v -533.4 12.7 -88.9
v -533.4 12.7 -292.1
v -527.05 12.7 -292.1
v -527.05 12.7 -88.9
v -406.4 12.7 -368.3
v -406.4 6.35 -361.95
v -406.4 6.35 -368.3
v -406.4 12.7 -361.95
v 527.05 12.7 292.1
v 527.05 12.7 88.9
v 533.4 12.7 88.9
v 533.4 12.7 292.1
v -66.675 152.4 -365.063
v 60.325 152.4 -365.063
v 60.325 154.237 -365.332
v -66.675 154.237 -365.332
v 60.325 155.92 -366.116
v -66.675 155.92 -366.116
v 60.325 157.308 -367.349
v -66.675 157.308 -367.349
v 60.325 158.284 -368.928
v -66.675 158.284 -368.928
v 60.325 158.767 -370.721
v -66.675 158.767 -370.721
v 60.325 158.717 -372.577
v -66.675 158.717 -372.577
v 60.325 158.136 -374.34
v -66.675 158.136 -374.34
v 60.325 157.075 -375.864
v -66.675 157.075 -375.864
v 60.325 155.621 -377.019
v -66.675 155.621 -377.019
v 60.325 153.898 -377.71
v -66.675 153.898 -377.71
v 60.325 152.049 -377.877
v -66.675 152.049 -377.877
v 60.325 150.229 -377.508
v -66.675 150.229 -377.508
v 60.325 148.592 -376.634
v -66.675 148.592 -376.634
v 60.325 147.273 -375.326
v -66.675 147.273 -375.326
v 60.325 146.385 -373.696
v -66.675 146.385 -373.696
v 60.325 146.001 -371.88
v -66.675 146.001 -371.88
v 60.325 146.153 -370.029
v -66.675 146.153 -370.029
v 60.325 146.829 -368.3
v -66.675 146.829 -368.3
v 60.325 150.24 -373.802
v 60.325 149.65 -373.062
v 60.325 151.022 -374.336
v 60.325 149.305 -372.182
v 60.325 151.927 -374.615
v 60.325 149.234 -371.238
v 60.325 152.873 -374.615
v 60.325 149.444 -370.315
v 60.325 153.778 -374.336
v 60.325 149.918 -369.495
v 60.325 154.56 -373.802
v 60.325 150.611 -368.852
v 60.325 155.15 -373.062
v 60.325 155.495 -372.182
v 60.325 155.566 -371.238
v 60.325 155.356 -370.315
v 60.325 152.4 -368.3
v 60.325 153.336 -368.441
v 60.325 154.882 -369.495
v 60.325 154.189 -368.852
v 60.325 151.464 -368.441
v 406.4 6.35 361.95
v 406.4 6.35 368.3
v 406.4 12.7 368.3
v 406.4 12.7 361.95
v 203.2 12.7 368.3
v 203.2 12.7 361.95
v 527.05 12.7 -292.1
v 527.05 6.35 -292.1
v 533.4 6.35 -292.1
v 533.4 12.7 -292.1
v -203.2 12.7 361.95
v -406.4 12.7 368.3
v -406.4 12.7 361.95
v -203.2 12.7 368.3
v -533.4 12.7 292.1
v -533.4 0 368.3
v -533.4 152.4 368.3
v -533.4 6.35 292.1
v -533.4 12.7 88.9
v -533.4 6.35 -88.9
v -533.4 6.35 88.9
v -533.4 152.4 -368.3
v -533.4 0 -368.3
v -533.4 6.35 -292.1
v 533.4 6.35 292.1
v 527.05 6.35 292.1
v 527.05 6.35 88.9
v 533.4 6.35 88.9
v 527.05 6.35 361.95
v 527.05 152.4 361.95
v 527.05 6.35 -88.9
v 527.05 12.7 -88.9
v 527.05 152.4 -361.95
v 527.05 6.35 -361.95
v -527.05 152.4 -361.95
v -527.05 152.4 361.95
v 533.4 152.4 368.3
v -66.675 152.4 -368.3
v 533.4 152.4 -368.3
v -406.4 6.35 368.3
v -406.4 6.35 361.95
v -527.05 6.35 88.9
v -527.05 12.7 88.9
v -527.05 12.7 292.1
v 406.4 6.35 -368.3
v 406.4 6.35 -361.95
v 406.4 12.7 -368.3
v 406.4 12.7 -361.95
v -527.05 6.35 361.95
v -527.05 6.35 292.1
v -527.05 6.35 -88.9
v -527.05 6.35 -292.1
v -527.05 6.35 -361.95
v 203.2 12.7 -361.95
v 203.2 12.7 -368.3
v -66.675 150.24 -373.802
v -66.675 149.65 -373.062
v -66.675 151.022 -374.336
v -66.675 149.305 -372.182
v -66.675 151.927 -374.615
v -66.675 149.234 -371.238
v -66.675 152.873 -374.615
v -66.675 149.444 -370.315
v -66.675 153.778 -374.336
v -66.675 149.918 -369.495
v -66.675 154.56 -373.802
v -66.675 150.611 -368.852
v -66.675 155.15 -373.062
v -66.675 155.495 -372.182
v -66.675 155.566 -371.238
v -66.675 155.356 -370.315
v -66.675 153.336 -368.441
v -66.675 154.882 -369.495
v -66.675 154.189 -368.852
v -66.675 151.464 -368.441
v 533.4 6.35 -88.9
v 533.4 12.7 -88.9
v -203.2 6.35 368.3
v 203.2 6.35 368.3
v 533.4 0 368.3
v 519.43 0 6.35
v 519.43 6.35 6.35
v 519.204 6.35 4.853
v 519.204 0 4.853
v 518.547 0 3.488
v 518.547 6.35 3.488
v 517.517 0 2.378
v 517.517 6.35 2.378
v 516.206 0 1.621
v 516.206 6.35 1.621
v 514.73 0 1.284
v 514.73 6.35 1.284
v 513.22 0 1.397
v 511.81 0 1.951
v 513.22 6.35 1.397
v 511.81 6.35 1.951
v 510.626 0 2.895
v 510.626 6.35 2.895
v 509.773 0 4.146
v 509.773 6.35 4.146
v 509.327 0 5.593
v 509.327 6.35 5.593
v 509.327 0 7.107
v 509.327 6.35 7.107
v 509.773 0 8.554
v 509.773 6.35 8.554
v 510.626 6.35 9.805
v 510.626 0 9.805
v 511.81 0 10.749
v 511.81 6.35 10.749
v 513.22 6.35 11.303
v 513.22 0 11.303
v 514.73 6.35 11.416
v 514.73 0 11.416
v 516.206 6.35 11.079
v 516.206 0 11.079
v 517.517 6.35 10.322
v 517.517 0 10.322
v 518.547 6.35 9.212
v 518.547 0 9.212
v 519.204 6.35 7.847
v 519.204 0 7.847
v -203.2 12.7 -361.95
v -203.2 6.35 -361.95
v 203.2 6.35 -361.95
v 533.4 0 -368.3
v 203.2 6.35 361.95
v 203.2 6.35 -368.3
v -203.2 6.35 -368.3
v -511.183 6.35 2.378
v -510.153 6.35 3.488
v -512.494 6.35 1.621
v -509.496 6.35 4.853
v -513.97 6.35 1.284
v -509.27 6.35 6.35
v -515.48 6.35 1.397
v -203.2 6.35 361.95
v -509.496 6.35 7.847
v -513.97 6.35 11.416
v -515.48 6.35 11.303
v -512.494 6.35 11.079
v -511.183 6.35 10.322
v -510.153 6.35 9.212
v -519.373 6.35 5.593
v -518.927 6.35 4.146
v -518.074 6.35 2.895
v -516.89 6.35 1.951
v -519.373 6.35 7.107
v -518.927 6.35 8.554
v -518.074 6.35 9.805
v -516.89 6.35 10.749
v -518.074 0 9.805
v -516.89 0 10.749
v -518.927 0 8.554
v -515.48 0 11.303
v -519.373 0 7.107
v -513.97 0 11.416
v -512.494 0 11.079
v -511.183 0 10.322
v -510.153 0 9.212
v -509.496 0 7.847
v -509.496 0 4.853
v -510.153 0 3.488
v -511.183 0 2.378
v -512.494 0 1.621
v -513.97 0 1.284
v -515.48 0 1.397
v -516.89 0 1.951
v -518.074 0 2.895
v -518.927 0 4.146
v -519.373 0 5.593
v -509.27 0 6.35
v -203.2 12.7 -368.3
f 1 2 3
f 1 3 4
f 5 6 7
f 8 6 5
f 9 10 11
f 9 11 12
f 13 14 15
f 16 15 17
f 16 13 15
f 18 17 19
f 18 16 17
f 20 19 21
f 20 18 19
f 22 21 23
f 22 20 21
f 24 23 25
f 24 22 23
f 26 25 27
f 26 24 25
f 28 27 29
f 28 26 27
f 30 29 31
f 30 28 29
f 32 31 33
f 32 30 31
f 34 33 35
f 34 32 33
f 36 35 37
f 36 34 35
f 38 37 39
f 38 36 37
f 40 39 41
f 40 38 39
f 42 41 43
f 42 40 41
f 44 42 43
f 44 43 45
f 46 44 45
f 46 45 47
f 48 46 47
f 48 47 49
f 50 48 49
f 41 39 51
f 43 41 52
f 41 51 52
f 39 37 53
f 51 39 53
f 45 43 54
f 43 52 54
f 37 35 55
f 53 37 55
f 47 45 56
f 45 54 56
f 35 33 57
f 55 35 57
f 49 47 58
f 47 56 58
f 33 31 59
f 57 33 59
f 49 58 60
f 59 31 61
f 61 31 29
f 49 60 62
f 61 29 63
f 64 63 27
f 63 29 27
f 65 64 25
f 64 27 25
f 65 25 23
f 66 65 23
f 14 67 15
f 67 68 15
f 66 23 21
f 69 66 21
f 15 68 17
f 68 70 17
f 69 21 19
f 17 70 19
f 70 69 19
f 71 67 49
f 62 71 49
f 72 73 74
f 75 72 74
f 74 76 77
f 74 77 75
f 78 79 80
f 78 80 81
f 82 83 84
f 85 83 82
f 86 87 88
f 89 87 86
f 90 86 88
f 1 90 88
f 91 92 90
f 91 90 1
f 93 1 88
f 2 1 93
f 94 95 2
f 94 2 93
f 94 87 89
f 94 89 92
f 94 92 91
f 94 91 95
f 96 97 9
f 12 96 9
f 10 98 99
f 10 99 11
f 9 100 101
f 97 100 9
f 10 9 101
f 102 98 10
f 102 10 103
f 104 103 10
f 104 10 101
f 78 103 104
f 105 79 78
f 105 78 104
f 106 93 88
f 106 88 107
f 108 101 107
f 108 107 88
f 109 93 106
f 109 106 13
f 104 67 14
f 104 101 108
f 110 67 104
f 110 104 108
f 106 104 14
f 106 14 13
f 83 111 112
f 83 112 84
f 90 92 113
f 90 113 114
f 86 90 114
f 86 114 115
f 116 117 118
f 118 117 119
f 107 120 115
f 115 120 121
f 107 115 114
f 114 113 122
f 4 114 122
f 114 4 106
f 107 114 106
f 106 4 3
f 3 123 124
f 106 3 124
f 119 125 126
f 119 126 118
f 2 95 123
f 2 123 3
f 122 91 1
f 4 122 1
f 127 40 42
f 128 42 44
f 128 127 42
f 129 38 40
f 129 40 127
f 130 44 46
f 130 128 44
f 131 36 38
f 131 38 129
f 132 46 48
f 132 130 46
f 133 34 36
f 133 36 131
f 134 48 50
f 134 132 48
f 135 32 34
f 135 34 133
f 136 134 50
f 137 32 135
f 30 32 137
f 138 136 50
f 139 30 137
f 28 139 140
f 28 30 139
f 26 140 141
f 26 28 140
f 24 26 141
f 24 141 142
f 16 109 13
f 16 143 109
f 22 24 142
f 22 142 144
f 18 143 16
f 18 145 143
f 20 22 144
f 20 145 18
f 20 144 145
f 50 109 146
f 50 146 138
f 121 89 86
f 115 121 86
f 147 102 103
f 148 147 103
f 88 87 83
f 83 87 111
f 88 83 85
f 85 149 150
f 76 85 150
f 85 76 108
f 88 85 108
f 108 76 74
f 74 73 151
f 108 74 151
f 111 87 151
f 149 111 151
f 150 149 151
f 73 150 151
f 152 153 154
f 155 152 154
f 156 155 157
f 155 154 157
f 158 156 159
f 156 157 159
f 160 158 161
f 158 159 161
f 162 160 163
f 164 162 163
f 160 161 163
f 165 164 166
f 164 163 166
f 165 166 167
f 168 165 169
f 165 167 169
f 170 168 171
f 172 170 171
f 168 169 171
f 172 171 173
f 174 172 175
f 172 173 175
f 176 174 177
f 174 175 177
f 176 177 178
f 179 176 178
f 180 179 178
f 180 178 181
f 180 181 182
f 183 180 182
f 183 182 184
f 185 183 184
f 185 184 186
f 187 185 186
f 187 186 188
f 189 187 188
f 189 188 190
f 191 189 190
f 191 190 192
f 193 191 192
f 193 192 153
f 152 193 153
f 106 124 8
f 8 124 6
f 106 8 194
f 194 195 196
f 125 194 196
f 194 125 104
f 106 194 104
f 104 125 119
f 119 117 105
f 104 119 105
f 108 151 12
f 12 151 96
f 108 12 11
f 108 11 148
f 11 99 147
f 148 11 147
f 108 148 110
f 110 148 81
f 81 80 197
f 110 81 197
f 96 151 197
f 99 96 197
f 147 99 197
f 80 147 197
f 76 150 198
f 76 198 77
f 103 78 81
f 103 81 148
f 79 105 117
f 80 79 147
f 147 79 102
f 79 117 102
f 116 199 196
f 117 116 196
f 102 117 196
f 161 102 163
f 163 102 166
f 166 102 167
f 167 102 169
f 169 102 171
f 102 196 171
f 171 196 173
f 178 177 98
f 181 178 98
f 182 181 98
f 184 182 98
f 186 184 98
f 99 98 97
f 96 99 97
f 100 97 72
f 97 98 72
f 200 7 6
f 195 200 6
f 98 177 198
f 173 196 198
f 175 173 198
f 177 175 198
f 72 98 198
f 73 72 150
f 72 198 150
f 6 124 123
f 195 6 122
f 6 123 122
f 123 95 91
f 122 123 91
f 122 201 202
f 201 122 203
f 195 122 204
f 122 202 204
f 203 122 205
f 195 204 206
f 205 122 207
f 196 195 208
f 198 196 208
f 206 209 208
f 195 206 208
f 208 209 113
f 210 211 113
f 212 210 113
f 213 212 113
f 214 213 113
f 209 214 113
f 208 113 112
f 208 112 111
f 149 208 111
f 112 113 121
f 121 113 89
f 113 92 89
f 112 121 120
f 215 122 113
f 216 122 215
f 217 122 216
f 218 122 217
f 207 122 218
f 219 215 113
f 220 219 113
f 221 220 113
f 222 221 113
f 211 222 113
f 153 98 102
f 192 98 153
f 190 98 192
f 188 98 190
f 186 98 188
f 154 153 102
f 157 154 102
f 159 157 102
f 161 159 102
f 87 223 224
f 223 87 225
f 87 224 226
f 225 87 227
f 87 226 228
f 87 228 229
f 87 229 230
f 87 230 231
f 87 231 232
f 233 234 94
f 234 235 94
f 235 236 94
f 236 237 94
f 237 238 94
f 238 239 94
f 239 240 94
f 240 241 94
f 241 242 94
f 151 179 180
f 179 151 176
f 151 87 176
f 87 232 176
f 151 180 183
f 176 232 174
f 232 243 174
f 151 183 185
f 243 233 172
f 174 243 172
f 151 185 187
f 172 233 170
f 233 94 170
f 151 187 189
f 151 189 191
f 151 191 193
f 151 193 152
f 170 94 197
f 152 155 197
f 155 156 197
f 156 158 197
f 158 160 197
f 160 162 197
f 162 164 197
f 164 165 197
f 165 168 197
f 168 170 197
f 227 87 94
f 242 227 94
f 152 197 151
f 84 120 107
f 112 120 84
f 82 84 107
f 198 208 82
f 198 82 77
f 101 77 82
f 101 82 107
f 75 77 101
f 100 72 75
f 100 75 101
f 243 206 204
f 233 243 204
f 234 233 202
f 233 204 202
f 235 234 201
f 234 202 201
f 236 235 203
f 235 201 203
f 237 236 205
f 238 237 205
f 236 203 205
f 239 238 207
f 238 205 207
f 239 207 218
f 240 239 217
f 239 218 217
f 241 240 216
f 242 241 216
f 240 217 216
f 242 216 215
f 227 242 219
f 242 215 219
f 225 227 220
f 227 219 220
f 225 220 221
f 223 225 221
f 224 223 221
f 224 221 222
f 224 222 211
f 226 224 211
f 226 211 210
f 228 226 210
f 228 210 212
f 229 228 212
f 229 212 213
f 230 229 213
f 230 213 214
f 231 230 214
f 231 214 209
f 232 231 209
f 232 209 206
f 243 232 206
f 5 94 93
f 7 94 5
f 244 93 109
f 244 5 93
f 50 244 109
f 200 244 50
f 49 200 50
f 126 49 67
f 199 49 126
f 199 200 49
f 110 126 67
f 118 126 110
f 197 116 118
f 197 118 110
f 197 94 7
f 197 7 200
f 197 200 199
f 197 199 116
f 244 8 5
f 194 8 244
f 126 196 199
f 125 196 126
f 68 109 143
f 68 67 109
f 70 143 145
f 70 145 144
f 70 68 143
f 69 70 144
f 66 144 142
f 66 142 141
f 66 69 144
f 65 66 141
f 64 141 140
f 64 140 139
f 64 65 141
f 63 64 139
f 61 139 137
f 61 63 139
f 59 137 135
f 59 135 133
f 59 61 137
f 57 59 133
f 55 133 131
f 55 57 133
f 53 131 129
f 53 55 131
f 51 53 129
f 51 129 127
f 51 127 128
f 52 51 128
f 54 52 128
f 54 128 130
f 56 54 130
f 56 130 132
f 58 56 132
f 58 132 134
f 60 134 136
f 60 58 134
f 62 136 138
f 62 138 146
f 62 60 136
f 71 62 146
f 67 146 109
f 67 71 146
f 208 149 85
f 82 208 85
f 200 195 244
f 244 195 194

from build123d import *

# Parameters (mm, degrees)
SKETCH1_W           = 1066.8
SKETCH1_H           = 736.6
BOSS_EXTRUDE1_DEPTH = 152.4
SHELL1_T            = -6.35
SKETCH2_R           = 5.08
CUT_EXTRUDE1_DEPTH  = 7.35
SKETCH3_W           = 203.2
SKETCH3_H           = 6.35
CUT_EXTRUDE3_DEPTH  = 737.6
SKETCH4_W           = 203.2
SKETCH4_H           = 6.35
CUT_EXTRUDE4_DEPTH  = 1067.8
SKETCH6_R           = 3.175
BOSS_EXTRUDE3_DEPTH = 63.5


with BuildPart() as part:
    # Sketch1 → Boss-Extrude1 (new body)
    with BuildSketch(Plane(origin=(0, 0, 0), x_dir=(1, 0, 0), z_dir=(0, 1, 0))):
        Rectangle(SKETCH1_W, SKETCH1_H)
    extrude(amount=BOSS_EXTRUDE1_DEPTH)

    # Shell1
    shell1_openings = [part.faces().sort_by_distance(p)[0] for p in [
        (0, 152.4, 0),
    ]]
    offset(amount=SHELL1_T, openings=shell1_openings, kind=Kind.INTERSECTION)

    # Sketch2 → Cut-Extrude1 (cut, through all)
    with BuildSketch(Plane(origin=(0, 6.35, 0), x_dir=(1, 0, 0), z_dir=(0, 1, 0))):
        with Locations((-514.35, -6.35)):
            Circle(SKETCH2_R)
        with Locations((514.35, -6.35)):
            Circle(SKETCH2_R)
    extrude(amount=-CUT_EXTRUDE1_DEPTH, mode=Mode.SUBTRACT)

    # Sketch3 → Cut-Extrude3 (cut, through all)
    with BuildSketch(Plane.XY.offset(368.3)):
        with Locations((-304.8, 9.525)):
            Rectangle(SKETCH3_W, SKETCH3_H)
        with Locations((304.8, 9.525)):
            Rectangle(SKETCH3_W, SKETCH3_H)
    extrude(amount=-CUT_EXTRUDE3_DEPTH, mode=Mode.SUBTRACT)

    # Sketch4 → Cut-Extrude4 (cut, through all)
    with BuildSketch(Plane.ZY.offset(533.4)):
        with Locations((-190.5, 9.525)):
            Rectangle(SKETCH4_W, SKETCH4_H)
        with Locations((190.5, 9.525)):
            Rectangle(SKETCH4_W, SKETCH4_H)
    extrude(amount=-CUT_EXTRUDE4_DEPTH, mode=Mode.SUBTRACT)

    # Sketch6 → Boss-Extrude3 (add, symmetric)
    with BuildSketch(Plane.ZY.offset(3.175)):
        with BuildLine():
            ThreePointArc((-365.06301296, 152.4), (-371.475, 158.81198704), (-377.88698704, 152.4))
            ThreePointArc((-377.88698704, 152.4), (-371.475, 145.98801296), (-365.06301296, 152.4))
        make_face()
        with Locations((-371.475, 152.4)):
            Circle(SKETCH6_R, mode=Mode.SUBTRACT)
    extrude(amount=BOSS_EXTRUDE3_DEPTH, both=True)


solid = part.part
